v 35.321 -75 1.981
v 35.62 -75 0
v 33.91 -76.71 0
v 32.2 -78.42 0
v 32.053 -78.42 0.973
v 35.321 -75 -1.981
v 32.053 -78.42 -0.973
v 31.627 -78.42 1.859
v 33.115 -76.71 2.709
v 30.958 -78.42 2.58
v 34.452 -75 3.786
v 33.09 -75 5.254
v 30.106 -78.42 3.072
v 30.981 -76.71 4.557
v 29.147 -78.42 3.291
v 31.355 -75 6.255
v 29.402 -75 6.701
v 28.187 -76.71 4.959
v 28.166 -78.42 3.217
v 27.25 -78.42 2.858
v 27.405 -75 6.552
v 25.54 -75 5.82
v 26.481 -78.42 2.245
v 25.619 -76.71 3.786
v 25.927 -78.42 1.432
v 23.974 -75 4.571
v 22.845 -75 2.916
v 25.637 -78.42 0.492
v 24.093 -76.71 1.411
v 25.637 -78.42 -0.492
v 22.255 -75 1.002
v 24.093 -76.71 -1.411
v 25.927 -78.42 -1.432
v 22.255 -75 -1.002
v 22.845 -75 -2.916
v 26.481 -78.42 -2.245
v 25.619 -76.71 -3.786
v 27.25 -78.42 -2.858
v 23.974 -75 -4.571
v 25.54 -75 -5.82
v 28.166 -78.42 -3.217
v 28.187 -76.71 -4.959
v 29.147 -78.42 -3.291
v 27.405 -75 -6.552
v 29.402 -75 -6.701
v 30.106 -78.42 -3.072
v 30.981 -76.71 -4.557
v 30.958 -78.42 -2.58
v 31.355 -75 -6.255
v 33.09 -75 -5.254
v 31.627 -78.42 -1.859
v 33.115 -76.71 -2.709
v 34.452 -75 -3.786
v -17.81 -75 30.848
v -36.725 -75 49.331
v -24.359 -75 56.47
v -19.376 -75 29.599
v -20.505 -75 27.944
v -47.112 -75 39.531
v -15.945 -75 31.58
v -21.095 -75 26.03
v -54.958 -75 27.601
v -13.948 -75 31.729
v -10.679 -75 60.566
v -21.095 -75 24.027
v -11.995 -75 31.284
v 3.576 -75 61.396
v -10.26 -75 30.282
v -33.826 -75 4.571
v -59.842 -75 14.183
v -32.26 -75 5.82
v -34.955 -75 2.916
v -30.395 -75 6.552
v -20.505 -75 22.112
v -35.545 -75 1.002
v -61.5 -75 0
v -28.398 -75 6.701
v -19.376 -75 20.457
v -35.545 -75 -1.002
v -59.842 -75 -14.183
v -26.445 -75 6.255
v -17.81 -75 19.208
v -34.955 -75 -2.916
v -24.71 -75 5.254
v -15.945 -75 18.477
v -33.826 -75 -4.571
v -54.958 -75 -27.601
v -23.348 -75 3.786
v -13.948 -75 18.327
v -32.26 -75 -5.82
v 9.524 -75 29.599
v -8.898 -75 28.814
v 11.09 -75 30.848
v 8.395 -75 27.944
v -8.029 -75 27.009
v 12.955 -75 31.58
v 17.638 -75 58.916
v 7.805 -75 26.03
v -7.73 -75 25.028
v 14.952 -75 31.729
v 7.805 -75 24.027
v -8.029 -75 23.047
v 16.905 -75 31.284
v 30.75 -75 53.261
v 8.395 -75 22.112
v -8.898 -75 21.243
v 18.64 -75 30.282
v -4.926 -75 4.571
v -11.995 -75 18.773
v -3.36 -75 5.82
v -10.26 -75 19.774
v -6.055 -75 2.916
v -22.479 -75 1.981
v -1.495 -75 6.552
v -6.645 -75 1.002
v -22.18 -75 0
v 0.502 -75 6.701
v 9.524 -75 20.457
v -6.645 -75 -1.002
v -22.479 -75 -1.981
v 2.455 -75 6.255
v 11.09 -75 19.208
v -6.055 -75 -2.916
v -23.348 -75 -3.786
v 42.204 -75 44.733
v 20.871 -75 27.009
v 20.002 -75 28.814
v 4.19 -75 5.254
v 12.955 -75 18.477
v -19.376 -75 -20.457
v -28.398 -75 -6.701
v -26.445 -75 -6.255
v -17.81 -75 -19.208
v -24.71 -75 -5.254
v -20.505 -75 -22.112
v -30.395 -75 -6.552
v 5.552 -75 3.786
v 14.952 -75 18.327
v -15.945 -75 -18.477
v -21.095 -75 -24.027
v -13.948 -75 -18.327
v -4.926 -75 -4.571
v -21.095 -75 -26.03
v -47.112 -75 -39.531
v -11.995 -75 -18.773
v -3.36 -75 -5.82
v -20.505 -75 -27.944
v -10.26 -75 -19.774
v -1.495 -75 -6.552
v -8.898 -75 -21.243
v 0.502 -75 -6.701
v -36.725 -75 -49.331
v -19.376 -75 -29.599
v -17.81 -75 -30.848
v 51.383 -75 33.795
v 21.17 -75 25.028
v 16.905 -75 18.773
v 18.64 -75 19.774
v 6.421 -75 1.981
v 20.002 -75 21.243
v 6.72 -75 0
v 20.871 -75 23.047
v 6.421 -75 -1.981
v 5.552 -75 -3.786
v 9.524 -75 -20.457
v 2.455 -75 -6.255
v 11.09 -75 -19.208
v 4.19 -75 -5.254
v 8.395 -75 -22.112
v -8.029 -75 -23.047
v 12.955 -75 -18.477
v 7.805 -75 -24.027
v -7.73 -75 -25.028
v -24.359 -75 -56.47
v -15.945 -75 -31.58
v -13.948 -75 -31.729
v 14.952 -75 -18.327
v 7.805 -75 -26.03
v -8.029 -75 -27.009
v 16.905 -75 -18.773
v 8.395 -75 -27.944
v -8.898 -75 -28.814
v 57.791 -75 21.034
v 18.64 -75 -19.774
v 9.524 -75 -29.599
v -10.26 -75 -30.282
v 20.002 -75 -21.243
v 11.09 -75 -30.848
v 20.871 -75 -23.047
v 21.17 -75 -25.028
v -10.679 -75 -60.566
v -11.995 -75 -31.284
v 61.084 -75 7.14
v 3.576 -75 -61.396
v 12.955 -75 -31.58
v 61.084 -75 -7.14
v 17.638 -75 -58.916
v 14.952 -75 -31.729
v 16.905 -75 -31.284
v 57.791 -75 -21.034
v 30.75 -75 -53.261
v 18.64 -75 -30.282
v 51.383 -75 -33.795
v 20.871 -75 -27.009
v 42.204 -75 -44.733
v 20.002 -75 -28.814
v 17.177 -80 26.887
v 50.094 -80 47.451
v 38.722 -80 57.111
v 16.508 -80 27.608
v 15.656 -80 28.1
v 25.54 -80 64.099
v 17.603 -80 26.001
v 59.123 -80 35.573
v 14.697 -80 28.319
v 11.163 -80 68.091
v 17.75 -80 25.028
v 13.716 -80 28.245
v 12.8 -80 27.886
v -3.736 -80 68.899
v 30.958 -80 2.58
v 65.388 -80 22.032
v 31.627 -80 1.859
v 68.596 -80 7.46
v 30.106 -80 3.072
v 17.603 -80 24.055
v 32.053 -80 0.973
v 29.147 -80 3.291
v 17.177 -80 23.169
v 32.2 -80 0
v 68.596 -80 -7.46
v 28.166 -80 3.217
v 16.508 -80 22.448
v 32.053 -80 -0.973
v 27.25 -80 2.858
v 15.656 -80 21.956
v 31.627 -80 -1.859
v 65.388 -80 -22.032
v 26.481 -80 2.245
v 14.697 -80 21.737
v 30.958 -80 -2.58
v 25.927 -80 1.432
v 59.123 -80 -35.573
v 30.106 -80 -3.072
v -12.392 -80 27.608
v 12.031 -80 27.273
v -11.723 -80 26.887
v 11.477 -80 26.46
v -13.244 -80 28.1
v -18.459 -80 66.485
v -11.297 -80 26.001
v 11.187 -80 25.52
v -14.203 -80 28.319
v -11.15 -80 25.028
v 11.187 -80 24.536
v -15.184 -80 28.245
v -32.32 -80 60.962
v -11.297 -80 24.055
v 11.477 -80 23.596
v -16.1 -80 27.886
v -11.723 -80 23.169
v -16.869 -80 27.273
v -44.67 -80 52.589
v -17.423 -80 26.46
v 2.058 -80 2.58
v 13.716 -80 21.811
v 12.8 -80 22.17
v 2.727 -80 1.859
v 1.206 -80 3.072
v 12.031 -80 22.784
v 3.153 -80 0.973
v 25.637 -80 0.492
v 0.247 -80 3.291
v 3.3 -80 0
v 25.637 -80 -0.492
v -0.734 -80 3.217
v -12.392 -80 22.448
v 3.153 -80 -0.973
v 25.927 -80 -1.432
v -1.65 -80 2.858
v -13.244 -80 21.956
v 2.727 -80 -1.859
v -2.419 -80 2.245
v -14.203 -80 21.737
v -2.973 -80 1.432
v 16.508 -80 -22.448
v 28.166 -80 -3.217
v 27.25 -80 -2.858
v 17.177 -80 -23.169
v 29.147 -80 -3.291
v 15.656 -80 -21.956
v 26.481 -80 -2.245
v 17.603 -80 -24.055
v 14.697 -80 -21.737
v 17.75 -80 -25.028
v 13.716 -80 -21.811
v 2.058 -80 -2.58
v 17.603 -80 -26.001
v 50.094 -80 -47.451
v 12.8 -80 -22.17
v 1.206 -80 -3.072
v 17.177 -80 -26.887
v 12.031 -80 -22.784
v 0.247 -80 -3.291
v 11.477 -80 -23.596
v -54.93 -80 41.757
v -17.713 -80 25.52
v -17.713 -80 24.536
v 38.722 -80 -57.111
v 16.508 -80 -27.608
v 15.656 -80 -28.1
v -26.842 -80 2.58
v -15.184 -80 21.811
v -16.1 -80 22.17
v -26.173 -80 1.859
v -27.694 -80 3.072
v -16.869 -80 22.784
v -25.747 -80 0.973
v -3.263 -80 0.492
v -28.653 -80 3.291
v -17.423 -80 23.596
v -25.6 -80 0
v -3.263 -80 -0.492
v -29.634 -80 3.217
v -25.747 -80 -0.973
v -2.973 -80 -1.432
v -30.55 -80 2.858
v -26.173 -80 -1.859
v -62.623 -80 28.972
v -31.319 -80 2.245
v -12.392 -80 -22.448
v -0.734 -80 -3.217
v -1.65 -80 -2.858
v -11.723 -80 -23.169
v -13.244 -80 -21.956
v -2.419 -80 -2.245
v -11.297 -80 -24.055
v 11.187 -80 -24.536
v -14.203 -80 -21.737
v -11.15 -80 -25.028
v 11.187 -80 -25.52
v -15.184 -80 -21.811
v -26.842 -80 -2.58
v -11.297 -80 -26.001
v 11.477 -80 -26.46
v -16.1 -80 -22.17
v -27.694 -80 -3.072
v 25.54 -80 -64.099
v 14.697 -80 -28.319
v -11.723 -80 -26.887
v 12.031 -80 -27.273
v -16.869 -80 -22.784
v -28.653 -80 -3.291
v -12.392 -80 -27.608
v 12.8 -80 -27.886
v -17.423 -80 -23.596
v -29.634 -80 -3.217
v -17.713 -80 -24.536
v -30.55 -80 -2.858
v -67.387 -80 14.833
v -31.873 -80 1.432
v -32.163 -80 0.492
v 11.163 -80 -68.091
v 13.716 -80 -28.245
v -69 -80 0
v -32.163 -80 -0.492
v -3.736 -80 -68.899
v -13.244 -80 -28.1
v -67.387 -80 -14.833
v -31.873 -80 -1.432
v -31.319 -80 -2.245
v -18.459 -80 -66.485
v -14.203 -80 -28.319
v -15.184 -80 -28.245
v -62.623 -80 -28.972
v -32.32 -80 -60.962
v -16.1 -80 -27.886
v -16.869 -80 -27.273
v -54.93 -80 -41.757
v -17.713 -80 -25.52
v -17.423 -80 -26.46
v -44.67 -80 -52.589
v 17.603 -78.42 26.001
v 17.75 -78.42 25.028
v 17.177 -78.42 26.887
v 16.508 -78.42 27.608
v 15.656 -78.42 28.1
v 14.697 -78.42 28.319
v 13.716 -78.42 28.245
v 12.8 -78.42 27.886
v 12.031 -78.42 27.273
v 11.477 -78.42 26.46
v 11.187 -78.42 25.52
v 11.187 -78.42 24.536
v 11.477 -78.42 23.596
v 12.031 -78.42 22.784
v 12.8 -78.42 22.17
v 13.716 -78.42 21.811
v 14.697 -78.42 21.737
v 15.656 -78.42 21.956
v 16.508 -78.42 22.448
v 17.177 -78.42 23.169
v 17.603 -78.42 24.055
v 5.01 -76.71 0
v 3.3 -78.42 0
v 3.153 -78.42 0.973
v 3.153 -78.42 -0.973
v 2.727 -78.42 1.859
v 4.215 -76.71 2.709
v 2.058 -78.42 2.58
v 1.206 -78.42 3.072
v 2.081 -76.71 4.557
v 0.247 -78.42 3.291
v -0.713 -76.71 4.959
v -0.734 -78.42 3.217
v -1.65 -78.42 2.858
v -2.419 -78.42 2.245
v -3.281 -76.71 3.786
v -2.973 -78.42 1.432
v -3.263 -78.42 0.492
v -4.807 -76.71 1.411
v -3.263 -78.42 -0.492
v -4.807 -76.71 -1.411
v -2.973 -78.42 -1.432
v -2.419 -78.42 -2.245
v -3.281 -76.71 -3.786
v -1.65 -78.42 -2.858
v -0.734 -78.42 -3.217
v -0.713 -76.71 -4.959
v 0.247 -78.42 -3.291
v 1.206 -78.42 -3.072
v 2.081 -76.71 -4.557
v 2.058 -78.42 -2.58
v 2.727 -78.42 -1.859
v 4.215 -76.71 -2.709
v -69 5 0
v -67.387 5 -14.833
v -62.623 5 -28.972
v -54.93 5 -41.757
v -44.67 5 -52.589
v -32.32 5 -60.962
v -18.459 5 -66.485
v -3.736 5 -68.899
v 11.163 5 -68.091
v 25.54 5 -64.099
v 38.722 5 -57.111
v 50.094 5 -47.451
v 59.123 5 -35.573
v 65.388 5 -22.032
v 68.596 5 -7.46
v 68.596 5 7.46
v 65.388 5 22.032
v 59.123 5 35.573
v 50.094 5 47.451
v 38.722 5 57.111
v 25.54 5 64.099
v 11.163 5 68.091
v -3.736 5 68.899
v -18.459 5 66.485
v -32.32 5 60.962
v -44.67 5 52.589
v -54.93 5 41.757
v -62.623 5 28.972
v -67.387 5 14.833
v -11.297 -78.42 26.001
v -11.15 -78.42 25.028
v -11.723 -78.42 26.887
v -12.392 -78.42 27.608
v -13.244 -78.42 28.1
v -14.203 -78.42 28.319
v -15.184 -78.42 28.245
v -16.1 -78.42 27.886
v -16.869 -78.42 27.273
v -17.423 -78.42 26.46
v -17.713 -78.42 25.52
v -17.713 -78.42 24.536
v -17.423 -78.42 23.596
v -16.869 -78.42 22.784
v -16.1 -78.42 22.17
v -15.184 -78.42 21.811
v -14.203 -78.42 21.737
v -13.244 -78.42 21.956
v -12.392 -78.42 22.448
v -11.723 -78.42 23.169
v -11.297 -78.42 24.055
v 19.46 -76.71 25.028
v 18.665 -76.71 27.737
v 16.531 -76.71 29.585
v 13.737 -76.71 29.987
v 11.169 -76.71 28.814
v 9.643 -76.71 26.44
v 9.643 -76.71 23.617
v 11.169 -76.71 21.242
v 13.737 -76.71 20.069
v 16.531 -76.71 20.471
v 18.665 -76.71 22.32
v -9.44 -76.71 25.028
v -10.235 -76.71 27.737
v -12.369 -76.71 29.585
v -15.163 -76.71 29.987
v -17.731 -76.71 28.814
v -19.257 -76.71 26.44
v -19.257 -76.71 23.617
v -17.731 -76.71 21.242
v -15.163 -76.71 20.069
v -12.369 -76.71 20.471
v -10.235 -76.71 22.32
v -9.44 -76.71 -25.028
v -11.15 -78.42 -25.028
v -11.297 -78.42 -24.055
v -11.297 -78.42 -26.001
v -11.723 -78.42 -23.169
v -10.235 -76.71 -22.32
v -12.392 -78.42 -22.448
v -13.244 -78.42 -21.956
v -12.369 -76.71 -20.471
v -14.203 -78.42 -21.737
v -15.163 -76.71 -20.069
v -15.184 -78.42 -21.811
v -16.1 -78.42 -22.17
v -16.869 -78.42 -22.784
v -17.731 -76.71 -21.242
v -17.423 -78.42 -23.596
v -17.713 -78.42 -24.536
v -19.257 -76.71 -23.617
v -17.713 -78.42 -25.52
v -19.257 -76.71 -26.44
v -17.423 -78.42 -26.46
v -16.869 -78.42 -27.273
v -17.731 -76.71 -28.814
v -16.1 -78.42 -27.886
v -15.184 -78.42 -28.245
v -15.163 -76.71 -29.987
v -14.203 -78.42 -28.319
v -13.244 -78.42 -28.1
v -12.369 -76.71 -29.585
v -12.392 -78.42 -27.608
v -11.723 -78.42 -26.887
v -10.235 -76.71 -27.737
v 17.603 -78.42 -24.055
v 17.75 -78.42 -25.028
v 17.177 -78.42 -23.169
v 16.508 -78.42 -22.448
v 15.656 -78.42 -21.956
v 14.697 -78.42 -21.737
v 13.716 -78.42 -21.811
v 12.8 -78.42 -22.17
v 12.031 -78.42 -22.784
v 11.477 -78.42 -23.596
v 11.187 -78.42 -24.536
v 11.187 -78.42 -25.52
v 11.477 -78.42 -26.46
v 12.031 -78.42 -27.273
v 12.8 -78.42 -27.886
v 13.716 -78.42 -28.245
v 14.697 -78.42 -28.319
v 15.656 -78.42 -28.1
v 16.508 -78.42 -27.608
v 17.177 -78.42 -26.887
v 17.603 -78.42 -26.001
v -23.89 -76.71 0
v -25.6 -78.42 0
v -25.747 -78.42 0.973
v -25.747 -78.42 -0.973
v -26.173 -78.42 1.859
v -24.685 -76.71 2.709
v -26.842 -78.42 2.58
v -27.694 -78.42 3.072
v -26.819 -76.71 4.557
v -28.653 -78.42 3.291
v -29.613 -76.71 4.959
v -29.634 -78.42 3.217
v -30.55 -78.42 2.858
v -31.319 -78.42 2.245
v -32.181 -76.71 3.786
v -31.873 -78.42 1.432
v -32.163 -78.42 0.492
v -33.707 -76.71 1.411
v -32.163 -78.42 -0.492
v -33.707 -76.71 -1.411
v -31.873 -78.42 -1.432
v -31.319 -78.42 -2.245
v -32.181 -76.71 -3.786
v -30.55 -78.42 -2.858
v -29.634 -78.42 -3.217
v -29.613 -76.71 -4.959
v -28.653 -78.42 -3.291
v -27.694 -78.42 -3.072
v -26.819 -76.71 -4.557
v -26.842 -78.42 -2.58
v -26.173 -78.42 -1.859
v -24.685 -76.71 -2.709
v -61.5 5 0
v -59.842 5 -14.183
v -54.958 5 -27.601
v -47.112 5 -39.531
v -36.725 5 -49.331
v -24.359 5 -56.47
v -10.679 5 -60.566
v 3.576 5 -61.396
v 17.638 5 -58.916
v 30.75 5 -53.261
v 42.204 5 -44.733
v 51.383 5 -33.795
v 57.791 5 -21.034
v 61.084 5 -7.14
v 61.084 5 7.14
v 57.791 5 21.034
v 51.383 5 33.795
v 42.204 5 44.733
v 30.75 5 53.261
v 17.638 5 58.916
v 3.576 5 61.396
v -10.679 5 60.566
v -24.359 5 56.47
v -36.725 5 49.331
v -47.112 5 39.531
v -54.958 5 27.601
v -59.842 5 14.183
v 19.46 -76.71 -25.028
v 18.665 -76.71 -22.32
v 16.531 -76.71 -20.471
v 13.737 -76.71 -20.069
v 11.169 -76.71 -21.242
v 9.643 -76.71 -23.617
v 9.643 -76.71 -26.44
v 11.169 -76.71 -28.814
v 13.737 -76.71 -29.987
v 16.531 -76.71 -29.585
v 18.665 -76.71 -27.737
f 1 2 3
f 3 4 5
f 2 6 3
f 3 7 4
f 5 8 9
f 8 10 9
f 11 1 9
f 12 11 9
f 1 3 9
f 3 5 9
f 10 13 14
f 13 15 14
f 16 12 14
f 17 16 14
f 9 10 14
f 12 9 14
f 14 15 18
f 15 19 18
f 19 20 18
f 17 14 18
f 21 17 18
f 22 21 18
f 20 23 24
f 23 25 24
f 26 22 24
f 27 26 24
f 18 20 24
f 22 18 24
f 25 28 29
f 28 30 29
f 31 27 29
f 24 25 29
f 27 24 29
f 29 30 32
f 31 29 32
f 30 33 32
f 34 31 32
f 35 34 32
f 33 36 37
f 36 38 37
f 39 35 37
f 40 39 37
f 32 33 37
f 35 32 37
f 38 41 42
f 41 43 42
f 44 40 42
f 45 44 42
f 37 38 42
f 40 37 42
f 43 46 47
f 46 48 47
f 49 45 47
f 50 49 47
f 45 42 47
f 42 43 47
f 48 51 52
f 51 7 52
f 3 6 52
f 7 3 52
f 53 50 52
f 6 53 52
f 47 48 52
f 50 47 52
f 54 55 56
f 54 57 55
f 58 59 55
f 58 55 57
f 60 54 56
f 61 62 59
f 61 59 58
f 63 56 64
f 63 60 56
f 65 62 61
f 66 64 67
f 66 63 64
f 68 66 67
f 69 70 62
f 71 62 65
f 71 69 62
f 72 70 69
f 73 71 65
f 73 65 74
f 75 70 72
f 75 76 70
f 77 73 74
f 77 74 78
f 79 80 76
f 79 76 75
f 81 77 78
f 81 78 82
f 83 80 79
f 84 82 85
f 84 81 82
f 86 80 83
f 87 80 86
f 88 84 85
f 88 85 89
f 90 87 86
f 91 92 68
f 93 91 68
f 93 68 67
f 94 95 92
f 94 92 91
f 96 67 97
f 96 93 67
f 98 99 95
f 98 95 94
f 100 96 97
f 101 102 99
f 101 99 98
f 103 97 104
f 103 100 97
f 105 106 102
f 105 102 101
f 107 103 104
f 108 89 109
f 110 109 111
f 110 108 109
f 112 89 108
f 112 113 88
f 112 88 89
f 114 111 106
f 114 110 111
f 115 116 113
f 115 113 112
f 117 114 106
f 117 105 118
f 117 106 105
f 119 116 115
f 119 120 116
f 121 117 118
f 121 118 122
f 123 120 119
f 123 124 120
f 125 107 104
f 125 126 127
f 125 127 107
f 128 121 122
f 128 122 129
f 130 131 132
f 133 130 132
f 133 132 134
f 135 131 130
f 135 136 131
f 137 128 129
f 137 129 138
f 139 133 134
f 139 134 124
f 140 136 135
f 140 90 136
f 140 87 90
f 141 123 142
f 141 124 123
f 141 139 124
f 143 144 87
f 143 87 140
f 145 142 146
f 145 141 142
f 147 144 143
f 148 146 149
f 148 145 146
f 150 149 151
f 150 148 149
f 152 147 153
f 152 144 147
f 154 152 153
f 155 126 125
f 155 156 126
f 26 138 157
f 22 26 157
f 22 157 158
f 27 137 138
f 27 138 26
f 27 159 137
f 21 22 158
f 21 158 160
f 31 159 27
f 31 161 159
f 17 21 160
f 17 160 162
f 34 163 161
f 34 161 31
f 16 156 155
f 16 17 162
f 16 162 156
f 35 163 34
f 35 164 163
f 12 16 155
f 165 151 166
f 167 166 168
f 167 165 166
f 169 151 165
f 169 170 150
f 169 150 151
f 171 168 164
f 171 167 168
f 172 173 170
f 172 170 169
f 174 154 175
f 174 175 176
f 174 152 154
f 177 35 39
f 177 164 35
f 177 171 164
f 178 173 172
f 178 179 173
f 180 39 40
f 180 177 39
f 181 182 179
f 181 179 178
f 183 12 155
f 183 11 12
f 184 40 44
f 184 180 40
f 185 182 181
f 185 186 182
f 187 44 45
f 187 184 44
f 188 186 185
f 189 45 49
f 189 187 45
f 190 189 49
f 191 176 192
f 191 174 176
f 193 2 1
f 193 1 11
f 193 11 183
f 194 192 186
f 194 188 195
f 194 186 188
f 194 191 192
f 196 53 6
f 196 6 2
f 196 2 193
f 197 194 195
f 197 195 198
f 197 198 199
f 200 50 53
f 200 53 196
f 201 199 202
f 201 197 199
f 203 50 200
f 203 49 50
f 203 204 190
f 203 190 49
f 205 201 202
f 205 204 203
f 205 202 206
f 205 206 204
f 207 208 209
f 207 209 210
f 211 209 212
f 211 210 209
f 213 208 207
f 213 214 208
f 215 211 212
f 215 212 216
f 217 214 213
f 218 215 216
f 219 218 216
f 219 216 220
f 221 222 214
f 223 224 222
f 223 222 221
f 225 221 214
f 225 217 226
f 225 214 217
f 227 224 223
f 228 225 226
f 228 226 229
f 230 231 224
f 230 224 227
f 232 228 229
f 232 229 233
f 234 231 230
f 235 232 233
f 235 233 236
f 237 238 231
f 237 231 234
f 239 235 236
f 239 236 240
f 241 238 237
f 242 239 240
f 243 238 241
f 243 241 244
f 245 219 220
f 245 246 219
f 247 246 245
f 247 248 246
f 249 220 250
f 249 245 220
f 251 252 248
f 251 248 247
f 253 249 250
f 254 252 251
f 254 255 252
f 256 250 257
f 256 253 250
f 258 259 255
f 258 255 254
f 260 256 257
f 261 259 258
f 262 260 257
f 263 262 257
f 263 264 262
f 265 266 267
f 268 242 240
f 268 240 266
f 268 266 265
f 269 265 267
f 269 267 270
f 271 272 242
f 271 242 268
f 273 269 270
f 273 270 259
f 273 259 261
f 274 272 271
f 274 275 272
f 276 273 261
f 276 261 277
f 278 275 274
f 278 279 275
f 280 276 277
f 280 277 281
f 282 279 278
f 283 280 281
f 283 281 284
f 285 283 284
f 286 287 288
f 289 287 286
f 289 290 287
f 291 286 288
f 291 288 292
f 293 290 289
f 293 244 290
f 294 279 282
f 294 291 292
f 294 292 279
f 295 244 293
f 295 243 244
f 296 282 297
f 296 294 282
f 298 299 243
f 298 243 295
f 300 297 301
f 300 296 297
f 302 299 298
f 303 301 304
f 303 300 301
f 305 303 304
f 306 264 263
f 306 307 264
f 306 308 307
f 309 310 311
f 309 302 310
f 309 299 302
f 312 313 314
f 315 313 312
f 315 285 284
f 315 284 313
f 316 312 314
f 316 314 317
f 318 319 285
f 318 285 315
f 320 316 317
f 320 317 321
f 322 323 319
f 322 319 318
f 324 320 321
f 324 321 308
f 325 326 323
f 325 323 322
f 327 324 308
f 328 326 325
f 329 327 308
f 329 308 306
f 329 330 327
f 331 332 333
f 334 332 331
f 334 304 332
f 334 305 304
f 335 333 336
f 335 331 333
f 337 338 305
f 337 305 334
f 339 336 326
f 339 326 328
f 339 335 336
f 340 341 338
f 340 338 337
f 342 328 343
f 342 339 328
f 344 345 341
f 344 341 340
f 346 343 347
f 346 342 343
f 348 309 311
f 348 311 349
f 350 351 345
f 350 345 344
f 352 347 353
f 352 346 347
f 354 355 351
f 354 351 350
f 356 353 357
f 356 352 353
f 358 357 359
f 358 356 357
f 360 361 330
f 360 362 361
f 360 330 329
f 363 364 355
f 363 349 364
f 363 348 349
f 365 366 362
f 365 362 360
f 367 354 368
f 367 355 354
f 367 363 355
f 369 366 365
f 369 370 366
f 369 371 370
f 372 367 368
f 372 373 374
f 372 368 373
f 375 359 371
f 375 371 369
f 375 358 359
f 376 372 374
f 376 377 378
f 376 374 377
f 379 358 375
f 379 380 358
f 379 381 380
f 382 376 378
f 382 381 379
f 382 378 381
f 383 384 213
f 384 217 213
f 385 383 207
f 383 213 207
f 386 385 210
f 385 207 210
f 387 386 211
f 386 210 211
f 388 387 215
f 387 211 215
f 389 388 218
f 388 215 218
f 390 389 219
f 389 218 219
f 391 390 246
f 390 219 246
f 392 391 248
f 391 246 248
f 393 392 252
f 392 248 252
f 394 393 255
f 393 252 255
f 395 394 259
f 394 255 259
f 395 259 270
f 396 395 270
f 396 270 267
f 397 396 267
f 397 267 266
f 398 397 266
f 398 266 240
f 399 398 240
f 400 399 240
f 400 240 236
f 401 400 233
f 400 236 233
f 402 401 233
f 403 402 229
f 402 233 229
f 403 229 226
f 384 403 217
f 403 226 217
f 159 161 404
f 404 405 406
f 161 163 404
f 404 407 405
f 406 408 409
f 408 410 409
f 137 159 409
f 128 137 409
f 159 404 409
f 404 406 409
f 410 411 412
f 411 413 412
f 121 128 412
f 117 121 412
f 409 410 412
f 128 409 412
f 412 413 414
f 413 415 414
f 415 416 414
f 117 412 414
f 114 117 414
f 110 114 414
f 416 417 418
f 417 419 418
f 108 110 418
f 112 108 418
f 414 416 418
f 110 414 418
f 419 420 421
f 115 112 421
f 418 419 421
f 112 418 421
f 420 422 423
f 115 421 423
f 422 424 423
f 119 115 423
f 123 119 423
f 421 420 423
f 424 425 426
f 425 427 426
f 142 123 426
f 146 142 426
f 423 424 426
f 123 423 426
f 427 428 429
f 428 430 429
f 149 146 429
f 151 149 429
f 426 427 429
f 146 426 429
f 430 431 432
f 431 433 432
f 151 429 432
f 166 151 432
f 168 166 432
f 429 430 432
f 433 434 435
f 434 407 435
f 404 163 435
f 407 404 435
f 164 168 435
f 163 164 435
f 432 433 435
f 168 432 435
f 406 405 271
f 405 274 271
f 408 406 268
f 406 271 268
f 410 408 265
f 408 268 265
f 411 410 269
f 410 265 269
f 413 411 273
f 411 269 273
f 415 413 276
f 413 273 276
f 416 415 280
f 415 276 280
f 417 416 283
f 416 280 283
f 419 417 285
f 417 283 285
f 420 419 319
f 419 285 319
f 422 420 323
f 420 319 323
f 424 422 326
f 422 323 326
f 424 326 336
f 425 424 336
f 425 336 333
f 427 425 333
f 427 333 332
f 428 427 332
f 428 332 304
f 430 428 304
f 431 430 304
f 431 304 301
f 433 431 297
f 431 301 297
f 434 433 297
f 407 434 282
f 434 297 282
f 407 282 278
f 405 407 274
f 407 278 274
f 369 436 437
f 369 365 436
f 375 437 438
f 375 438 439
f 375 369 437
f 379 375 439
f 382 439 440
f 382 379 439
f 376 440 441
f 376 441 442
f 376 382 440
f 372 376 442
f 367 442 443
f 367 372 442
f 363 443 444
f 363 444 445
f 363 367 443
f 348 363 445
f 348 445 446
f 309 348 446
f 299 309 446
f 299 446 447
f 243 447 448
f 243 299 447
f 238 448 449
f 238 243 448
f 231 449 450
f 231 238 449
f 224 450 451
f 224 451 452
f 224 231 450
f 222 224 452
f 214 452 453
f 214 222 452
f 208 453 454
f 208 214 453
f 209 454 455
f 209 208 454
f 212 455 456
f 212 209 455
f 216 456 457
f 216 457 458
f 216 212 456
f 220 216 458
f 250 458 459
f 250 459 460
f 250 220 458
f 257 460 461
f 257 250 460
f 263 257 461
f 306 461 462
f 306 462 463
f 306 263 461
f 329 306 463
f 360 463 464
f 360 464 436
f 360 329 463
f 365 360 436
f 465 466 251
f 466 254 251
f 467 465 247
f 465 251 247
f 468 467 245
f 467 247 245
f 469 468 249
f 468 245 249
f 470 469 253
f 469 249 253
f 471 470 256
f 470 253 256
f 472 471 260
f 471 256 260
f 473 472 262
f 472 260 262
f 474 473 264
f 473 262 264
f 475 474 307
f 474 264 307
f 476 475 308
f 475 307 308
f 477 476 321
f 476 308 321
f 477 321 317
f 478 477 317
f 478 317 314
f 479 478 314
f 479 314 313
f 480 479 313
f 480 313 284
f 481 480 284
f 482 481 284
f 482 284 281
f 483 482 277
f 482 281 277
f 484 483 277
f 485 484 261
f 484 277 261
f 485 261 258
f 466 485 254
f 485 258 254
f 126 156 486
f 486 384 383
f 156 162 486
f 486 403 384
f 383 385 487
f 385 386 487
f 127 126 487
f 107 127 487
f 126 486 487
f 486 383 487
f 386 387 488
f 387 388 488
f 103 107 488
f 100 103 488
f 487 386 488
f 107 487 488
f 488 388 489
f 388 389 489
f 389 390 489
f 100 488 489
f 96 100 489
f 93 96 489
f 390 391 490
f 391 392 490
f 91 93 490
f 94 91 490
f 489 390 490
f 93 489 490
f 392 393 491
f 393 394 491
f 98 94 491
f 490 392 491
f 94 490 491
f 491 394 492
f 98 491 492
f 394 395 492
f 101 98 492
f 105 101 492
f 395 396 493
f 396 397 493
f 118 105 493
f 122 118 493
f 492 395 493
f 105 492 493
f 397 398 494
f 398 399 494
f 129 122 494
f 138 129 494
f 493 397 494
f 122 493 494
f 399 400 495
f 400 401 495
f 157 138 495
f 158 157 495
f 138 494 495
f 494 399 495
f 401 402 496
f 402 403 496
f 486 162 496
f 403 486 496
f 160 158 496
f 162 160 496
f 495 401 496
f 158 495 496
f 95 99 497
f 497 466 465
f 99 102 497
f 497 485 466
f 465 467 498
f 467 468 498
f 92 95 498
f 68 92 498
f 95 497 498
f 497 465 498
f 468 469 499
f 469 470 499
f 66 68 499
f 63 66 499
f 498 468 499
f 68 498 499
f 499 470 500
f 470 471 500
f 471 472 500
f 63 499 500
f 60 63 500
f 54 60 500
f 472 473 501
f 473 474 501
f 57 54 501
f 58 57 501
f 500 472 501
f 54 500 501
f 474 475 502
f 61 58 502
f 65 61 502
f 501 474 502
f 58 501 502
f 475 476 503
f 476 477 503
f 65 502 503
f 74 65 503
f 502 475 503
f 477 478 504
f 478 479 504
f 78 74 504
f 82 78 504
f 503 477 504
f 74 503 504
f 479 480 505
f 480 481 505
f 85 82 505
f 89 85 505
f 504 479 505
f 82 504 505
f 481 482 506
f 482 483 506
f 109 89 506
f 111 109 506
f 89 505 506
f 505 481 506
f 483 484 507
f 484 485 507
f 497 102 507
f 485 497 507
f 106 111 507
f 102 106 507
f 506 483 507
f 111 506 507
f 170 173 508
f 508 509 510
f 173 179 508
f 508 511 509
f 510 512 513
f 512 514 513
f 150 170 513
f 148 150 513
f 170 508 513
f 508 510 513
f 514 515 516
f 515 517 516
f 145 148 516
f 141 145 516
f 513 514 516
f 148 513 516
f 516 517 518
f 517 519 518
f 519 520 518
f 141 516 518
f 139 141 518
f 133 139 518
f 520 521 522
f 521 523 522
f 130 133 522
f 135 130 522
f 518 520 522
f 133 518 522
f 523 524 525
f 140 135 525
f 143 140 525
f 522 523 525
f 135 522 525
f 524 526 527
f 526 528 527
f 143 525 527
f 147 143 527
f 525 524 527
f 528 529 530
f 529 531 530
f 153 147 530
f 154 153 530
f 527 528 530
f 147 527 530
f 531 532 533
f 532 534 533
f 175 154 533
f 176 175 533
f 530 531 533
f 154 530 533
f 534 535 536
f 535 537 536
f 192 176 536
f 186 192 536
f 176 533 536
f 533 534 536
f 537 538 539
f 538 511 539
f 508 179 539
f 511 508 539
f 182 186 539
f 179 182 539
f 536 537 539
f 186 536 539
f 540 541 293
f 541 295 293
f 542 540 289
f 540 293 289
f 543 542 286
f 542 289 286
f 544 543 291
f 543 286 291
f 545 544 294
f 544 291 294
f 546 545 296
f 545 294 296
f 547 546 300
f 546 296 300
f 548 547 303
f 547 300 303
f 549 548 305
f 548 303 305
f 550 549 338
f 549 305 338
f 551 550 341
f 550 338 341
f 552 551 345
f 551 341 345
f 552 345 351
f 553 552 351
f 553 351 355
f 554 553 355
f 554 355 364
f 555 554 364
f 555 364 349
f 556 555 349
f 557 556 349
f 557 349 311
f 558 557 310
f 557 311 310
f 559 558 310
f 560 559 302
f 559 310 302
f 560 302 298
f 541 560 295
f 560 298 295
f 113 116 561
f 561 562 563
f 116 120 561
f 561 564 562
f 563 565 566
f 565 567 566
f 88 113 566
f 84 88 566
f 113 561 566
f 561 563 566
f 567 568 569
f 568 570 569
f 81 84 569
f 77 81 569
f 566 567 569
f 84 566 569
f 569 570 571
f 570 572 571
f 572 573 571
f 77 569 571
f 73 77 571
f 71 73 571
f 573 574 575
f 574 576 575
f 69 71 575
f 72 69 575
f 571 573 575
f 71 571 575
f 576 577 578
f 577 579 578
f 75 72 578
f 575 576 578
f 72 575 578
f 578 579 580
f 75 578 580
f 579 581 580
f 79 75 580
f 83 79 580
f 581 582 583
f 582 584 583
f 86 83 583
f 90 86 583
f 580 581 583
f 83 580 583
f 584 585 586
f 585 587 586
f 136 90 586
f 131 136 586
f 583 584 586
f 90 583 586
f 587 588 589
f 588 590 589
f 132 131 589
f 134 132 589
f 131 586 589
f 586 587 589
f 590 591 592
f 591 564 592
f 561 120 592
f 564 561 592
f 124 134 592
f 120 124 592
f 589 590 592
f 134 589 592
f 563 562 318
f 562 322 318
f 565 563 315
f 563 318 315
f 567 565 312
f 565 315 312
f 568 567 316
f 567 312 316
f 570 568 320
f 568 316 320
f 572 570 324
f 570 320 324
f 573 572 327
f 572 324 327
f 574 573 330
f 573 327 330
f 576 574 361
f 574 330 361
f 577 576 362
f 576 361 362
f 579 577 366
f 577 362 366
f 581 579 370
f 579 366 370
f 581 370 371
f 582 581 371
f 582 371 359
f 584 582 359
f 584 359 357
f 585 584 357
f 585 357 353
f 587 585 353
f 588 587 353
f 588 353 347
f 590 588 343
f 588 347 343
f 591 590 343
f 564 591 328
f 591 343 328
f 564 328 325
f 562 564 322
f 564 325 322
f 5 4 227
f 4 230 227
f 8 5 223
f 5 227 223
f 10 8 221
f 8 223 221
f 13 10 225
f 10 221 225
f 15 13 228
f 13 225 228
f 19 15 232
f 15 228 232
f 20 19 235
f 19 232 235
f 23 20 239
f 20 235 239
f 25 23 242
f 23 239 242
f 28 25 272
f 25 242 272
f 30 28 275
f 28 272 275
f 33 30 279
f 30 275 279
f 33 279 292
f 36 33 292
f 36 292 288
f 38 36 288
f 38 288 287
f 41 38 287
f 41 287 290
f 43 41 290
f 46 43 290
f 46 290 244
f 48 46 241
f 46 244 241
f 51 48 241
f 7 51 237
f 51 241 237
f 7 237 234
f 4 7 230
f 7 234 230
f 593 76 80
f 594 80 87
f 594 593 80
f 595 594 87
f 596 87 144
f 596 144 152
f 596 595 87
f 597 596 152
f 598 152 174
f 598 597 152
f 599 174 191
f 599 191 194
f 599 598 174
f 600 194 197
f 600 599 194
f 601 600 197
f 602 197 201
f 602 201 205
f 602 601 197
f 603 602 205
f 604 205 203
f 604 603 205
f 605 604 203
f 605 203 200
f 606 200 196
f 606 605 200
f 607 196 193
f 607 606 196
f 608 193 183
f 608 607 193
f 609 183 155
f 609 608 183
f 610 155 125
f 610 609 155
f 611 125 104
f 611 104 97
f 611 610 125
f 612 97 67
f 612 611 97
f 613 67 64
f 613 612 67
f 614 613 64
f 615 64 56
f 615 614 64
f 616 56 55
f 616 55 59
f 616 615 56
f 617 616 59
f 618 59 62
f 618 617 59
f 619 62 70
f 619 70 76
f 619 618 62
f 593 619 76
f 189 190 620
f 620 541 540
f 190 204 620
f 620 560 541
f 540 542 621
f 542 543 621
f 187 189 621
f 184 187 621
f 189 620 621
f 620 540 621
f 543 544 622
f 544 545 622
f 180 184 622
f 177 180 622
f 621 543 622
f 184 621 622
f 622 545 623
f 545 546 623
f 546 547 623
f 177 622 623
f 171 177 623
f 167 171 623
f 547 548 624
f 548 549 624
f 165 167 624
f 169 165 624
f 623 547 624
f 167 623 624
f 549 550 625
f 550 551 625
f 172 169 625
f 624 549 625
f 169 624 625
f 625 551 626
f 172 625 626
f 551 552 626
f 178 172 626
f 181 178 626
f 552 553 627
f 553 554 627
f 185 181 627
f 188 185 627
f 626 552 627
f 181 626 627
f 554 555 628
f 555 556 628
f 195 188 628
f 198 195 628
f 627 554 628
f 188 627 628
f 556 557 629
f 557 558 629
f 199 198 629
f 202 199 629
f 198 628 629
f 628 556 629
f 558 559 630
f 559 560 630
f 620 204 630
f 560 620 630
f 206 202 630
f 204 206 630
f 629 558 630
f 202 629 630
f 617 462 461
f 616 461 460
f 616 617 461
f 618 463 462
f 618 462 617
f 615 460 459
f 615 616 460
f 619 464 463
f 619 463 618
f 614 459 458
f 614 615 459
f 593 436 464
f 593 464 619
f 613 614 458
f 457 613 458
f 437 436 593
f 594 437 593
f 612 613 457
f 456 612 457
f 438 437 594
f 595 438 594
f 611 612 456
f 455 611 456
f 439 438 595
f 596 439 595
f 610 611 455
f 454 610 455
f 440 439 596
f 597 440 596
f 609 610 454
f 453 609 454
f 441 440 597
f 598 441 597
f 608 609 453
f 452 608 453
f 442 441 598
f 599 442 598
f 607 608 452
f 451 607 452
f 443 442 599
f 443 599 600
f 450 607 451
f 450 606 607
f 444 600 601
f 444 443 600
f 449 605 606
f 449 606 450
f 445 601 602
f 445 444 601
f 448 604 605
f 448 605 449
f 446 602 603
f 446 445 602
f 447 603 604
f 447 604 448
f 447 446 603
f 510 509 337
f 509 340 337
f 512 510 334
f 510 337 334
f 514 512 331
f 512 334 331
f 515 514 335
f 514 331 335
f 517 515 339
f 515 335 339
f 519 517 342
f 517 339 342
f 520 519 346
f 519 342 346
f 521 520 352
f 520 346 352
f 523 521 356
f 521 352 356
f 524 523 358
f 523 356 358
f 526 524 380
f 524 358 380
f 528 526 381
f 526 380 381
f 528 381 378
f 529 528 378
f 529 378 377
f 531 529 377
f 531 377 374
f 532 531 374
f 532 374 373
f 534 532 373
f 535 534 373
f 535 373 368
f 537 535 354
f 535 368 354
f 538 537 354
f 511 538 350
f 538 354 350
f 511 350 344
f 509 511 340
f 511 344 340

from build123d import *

# Parameters (mm, degrees)
F3_D           = 6.6
F3_CSINK_D     = 13.44
F3_CSINK_ANGLE = 90


with BuildPart() as f1:
    # F0 (on Top) → F1 (revolve)
    with BuildSketch(Plane.XY):
        Polygon((-69, 5), (-69, -75), (-69, -80), (-61.5, -80), (0, -80), (0, -75), (-61.5, -75), (-61.5, 5), align=None)
    revolve(axis=Axis((0, -39.125, 0), (0, -1, 0)))

    # F3 (through all)
    with Locations(Plane(origin=(0, -75, 0), x_dir=(-1, 0, 0), z_dir=(0, 1, 0))):
        with Locations((14.45, 25.0281341694), (0, 0), (28.9, 0), (14.45, -25.0281341694), (-14.45, -25.0281341694), (-28.9, 0), (-14.45, 25.0281341694)):
            CounterSinkHole(F3_D / 2, F3_CSINK_D / 2, counter_sink_angle=F3_CSINK_ANGLE)


solid = f1.part
